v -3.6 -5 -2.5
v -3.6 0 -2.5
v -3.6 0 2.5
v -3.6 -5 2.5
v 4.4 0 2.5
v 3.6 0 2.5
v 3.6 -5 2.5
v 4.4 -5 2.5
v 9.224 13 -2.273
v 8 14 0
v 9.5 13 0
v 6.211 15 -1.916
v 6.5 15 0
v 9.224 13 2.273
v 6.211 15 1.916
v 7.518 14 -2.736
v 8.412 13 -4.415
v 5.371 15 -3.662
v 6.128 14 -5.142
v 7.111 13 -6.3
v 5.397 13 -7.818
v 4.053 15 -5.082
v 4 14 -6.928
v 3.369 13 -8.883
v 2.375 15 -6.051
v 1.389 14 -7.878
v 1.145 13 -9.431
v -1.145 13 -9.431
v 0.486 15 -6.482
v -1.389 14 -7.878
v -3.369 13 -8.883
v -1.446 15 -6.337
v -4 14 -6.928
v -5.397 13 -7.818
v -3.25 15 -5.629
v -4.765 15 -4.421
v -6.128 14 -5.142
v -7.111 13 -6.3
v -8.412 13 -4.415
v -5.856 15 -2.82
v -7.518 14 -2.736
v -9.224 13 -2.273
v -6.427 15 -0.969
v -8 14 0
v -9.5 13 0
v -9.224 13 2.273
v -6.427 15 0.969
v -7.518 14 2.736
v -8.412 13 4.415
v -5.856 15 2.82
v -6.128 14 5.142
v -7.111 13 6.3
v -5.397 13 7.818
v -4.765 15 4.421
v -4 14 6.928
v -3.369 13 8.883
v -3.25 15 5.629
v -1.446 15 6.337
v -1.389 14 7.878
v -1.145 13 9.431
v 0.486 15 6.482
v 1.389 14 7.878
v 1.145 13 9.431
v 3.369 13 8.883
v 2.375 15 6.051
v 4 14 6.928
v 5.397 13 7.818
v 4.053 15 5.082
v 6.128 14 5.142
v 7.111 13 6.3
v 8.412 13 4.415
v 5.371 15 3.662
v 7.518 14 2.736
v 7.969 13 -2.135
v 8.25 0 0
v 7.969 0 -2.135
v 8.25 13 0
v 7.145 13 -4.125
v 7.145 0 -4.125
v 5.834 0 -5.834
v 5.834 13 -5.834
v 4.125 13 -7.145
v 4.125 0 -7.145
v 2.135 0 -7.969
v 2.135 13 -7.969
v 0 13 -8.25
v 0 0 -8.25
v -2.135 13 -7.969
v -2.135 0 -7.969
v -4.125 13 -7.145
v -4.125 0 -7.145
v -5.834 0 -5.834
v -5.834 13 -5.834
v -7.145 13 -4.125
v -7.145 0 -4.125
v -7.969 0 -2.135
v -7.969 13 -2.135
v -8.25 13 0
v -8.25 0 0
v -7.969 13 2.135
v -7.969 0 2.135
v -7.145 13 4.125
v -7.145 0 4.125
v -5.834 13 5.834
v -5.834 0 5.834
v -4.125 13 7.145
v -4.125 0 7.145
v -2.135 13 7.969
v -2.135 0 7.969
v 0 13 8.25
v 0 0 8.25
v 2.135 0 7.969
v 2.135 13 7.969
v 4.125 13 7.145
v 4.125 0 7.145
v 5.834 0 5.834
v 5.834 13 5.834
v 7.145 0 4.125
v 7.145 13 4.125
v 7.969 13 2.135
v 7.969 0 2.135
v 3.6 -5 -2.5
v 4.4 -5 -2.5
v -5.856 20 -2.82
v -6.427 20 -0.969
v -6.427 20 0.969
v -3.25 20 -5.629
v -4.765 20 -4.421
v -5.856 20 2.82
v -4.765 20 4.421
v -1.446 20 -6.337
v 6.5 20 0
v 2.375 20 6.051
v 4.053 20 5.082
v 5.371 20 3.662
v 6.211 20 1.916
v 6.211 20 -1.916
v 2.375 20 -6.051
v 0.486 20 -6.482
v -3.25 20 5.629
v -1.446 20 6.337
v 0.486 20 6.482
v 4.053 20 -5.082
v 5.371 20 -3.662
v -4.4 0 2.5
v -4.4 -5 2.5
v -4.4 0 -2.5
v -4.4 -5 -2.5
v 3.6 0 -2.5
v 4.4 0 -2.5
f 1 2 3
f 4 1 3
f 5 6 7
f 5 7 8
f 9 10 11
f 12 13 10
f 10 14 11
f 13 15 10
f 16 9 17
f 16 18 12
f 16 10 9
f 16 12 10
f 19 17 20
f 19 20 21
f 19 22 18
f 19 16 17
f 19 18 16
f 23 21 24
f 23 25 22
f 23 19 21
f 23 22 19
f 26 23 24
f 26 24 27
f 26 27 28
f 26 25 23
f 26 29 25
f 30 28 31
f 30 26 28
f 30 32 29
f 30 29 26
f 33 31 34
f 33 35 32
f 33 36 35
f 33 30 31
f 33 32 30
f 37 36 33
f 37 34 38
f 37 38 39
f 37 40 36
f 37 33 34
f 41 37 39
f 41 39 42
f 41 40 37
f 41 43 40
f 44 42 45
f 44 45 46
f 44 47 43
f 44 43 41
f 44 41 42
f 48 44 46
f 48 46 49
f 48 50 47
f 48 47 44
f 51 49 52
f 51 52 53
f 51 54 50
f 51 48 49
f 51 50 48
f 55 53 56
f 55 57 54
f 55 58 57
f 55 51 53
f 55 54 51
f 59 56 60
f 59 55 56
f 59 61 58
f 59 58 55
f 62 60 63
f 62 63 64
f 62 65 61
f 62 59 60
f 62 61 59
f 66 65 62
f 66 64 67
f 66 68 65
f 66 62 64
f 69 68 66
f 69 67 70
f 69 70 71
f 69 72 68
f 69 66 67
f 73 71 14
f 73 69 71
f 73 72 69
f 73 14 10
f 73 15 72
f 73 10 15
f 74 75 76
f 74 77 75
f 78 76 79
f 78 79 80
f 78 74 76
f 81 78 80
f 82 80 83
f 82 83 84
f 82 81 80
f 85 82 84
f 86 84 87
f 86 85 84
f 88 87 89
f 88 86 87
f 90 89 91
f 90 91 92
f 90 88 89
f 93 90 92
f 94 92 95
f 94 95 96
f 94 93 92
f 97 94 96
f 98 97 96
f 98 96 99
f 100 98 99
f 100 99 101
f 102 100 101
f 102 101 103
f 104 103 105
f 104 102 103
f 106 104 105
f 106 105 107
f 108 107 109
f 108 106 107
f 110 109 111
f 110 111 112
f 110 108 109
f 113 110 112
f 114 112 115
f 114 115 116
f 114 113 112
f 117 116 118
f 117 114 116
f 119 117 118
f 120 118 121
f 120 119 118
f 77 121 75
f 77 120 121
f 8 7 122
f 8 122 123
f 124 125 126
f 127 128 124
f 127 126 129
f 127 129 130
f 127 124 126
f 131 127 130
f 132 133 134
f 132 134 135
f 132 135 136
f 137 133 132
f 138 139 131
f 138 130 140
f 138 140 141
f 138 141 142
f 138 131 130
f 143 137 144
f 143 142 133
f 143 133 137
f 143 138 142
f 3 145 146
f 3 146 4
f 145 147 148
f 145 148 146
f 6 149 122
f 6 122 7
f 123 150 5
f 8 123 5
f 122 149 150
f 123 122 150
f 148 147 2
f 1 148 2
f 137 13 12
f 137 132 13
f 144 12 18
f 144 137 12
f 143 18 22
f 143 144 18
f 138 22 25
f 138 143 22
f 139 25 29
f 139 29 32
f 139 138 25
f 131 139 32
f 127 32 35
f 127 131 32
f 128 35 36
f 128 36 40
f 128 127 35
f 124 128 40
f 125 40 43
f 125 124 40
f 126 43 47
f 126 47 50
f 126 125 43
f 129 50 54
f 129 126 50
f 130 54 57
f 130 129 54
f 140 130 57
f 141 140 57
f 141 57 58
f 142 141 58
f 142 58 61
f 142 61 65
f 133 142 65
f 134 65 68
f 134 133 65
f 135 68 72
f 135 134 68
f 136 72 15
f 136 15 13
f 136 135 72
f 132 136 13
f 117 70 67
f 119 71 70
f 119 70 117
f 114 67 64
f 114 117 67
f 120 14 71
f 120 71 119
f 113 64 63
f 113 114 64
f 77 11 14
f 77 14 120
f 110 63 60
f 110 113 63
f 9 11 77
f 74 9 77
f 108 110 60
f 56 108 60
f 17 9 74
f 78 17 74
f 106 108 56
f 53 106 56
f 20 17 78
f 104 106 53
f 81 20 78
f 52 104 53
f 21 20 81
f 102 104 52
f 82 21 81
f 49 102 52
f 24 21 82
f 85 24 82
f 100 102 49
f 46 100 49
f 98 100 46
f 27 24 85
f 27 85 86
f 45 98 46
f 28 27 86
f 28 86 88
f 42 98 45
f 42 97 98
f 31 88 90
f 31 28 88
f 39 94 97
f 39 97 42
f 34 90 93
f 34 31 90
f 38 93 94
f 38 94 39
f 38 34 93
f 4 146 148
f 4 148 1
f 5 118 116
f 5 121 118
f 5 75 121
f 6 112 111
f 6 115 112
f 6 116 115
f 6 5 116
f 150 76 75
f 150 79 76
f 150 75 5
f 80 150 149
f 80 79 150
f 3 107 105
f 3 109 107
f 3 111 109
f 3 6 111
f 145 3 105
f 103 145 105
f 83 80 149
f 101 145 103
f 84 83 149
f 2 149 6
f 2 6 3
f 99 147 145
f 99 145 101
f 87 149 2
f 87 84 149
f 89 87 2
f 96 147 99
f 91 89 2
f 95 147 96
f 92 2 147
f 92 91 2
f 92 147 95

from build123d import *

# Parameters (mm, degrees)
SKETCH_2_W      = 0.8
SKETCH_2_H      = 5
EXTRUDE_1_DEPTH = 5


with BuildPart() as part:
    # Эскиз1 → Повернуть1 (revolve)
    with BuildSketch(Plane.XY):
        Polygon((0, 0), (8.25, 0), (8.25, 13), (9.5, 13), (6.5, 15), (6.5, 20), (0, 20), align=None)
    revolve(axis=Axis((0, -275.009579947, 0), (0, 1, 0)))

    # Эскиз2 → Бобышка-Вытянуть1 (add)
    with BuildSketch(Plane.XZ):
        with Locations((-4, 0)):
            Rectangle(SKETCH_2_W, SKETCH_2_H)
        with Locations((4, 0)):
            Rectangle(SKETCH_2_W, SKETCH_2_H)
    extrude(amount=EXTRUDE_1_DEPTH)


solid = part.part
